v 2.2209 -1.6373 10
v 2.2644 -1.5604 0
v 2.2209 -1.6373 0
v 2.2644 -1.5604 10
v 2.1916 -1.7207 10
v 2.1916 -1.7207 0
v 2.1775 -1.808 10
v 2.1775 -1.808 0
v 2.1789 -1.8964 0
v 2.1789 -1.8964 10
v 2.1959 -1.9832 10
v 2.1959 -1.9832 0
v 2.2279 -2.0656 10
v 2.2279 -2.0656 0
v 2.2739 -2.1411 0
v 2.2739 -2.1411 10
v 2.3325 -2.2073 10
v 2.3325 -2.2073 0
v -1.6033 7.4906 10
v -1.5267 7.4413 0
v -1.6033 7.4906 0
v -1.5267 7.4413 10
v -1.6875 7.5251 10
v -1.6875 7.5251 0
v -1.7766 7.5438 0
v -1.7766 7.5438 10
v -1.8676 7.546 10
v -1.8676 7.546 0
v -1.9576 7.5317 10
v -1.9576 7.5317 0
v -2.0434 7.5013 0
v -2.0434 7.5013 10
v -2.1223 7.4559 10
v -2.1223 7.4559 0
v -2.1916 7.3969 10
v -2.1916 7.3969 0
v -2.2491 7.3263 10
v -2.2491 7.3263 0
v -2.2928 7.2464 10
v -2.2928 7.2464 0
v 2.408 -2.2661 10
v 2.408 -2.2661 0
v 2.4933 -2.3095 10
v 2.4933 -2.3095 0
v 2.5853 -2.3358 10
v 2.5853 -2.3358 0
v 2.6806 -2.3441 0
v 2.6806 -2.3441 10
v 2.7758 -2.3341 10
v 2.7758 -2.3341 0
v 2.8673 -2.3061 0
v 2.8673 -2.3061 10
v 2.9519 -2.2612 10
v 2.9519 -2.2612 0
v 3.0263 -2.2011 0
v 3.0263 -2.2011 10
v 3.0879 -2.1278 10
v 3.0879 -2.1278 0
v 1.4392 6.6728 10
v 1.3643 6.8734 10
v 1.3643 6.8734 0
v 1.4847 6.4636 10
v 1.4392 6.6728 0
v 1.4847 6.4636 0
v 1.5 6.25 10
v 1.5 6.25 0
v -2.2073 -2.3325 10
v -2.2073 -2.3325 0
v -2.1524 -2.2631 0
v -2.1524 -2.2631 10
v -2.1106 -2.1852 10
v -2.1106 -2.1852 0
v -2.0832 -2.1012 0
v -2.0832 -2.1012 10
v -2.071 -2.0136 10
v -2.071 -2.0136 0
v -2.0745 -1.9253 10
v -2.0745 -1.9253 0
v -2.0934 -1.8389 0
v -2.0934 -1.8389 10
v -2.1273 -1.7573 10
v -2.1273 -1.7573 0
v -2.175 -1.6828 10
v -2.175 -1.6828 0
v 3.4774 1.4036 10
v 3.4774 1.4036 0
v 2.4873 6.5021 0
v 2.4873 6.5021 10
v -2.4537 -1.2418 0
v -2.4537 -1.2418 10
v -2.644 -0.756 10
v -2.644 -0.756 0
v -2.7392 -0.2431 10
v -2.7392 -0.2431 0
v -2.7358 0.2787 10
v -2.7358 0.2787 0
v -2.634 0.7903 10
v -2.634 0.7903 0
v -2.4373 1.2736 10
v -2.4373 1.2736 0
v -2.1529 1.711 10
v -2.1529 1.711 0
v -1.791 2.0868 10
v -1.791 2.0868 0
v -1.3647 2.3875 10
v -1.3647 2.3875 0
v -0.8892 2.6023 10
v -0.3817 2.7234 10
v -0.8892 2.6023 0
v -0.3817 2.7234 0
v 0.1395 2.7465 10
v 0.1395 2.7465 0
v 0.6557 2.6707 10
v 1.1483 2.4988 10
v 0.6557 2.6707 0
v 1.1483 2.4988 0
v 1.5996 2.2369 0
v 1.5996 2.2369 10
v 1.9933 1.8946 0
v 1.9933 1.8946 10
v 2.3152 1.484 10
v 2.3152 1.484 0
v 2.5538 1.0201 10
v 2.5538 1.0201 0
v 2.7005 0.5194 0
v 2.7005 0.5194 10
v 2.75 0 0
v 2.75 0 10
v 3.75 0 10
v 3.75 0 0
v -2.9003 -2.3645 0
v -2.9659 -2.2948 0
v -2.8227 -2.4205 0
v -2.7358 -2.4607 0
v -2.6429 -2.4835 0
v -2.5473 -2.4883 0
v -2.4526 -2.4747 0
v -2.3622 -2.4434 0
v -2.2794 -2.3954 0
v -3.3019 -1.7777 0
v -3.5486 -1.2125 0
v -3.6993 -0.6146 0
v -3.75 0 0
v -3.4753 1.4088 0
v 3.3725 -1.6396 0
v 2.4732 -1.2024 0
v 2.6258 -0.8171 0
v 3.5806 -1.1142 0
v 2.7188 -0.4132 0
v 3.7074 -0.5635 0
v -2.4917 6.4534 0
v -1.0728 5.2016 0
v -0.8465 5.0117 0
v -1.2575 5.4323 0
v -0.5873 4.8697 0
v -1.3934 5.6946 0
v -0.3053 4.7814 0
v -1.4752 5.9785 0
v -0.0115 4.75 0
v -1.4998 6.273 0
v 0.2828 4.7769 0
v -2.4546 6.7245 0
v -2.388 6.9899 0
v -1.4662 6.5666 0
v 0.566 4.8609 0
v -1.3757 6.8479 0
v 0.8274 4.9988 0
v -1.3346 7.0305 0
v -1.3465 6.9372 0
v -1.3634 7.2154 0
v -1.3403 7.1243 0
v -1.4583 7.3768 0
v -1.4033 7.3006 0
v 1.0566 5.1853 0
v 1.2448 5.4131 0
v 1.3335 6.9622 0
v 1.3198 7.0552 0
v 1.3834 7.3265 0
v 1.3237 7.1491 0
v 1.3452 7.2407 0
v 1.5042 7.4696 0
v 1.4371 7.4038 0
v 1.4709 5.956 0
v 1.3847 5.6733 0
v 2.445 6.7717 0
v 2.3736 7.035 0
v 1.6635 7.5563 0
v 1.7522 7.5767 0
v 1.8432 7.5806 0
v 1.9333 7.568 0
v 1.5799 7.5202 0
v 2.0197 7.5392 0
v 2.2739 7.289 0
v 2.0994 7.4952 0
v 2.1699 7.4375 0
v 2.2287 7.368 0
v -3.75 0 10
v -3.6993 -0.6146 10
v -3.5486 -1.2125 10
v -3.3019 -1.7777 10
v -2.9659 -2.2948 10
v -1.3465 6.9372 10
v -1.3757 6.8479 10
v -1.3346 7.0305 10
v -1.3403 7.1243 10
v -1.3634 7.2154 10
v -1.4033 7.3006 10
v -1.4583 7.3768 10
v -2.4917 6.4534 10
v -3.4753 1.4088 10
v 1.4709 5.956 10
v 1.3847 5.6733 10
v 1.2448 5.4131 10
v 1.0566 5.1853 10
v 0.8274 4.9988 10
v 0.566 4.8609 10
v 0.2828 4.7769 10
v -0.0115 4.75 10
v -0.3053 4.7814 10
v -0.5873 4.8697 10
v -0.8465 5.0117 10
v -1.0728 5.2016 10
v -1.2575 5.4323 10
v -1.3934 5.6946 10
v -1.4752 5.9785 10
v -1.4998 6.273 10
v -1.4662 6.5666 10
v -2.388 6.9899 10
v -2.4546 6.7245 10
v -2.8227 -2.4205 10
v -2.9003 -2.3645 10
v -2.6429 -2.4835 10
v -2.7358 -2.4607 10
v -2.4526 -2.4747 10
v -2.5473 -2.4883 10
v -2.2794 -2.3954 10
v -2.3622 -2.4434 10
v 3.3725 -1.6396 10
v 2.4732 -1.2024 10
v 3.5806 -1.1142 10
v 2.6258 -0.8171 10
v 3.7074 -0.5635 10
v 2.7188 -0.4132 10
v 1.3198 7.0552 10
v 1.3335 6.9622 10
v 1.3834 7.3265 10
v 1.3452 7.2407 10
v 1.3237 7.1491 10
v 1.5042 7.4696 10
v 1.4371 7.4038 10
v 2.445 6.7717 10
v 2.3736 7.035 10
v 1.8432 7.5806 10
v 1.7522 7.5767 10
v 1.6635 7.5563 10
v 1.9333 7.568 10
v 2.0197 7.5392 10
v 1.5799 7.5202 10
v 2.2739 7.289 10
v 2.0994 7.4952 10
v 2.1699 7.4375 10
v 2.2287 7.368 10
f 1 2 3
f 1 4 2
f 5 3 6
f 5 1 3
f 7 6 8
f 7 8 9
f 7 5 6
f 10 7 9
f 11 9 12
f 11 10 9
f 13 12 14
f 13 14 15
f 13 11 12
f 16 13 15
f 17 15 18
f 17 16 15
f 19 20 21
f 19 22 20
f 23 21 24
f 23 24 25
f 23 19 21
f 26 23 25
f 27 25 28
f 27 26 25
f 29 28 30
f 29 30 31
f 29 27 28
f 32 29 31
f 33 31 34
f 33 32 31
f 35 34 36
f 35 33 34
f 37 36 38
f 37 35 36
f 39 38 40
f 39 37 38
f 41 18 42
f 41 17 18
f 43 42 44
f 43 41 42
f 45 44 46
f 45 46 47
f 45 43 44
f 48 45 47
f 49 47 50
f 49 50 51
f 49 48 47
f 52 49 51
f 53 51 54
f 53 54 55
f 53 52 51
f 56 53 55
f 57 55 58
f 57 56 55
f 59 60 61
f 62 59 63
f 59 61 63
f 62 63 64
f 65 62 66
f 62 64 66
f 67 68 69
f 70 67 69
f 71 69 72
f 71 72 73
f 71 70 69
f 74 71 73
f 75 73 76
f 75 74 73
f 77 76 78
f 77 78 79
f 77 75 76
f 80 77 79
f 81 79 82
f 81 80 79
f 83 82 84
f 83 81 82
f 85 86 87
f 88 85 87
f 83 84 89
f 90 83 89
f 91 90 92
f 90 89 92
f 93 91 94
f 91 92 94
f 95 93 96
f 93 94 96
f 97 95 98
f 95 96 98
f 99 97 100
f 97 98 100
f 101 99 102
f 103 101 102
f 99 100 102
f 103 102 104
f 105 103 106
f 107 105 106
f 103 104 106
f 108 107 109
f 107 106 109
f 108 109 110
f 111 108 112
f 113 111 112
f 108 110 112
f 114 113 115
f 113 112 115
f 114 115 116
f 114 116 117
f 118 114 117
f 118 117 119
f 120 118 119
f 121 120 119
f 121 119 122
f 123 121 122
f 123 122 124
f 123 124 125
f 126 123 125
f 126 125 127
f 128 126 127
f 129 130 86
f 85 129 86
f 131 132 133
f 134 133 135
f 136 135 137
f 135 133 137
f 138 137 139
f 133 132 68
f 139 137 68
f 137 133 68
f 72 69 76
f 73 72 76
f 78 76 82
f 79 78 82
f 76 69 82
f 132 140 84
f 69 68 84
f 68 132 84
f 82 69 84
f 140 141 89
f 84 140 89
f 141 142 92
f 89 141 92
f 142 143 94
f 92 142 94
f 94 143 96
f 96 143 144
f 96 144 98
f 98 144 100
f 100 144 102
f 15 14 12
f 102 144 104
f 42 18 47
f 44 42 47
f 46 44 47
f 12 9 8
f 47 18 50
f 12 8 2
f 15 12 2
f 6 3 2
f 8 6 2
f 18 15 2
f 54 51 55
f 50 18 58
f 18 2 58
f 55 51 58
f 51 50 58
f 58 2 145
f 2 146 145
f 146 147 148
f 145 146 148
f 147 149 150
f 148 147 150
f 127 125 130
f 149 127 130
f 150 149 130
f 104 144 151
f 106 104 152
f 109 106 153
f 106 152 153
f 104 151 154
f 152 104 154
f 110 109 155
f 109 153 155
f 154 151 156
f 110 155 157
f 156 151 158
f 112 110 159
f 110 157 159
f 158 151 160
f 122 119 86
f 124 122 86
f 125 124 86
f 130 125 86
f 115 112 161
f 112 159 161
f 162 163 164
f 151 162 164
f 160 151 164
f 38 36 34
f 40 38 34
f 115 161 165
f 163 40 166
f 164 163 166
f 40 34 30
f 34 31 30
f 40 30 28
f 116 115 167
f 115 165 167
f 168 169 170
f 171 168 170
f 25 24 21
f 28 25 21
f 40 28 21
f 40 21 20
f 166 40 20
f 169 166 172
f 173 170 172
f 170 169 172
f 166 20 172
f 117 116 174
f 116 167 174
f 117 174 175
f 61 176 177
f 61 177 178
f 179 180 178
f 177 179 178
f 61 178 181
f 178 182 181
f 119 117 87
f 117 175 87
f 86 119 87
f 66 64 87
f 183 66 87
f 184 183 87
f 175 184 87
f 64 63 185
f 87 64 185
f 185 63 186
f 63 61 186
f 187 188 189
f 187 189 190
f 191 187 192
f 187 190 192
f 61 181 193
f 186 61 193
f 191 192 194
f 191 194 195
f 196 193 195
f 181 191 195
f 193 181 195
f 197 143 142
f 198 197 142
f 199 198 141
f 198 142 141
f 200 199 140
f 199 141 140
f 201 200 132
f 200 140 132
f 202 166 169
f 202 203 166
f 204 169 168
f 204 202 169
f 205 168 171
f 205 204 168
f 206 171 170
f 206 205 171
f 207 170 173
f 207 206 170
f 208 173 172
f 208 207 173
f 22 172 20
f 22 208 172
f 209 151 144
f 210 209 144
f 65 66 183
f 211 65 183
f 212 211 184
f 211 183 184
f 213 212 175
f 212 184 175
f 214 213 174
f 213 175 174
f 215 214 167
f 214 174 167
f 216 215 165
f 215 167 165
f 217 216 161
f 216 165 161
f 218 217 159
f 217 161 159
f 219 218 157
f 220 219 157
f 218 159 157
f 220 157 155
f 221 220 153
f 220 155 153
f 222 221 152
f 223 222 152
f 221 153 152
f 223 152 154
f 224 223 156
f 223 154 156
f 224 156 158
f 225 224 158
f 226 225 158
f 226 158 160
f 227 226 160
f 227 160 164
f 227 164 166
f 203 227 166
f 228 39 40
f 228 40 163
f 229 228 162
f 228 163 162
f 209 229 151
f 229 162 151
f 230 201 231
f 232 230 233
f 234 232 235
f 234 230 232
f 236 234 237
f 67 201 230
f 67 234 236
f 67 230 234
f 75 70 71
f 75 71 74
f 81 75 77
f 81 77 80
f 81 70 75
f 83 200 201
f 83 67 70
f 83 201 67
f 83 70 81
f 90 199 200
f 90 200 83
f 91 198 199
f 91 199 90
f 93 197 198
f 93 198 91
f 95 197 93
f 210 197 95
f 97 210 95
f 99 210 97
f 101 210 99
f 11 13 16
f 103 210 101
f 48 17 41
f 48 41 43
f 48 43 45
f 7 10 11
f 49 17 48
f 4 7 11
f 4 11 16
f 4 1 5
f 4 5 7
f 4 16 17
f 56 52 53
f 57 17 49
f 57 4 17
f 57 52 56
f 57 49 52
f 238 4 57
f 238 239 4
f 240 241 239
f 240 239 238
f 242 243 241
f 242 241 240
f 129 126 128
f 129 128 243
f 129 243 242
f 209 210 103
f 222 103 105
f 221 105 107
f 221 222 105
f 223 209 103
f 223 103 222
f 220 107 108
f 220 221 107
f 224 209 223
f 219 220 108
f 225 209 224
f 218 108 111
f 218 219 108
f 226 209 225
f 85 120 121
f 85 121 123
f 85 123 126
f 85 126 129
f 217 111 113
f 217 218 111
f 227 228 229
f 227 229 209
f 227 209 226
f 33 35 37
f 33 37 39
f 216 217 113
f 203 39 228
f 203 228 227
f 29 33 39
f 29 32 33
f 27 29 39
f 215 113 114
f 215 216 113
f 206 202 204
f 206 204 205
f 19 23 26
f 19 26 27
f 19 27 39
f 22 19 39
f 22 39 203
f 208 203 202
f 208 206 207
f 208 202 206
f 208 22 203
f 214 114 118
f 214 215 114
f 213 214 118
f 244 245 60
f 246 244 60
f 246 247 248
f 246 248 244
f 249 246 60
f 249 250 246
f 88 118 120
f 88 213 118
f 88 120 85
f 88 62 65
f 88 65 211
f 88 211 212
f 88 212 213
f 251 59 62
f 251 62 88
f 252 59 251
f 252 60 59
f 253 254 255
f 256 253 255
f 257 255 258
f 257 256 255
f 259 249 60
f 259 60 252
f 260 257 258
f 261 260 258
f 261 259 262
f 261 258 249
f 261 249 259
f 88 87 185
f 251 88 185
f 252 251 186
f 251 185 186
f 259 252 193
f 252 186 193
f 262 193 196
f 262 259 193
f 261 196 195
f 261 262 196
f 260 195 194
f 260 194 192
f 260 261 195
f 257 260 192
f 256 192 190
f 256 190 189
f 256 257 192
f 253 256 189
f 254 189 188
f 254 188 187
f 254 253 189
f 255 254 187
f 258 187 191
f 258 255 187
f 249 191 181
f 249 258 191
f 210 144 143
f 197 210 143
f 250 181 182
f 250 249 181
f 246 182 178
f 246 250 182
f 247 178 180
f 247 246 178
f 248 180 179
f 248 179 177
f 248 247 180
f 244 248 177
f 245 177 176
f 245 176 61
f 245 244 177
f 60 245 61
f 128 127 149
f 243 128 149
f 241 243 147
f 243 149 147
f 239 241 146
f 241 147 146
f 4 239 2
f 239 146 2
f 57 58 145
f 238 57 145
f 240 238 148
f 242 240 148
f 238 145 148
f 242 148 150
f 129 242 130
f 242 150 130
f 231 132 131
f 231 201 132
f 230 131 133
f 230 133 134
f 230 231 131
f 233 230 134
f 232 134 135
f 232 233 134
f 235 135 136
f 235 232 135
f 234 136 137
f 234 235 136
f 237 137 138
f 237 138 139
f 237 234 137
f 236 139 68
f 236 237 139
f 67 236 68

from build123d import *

# Parameters (mm, degrees)
F1_DEPTH = 10
F2_R     = 0.49999


# Not quite as in the source:
# - a fillet or chamfer is up to 0.001 mm smaller than in the source, because OpenCascade refuses the exact size


with BuildPart() as f1:
    # F0 (on Top) → F1 (new body)
    with BuildSketch(Plane.XY):
        with BuildLine():
            Line((-3.4753119677, 1.4087961978), (-3.75, 0))
            ThreePointArc((-3.75, 0), (-3.4444328428, -1.4826943014), (-2.5775293913, -2.723755172))
            Line((-2.5775293913, -2.723755172), (-1.8901882203, -1.9974204595))
            ThreePointArc((-1.8901882203, -1.9974204595), (-1.0873091543, 2.5259174181), (2.75, 0))
            ThreePointArc((2.75, 0), (2.5549370113, -1.0172496587), (1.9974204595, -1.8901882203))
            Line((1.9974204595, -1.8901882203), (2.723755172, -2.5775293913))
            ThreePointArc((2.723755172, -2.5775293913), (3.4840050154, -1.3871586256), (3.75, 0))
            Line((3.75, 0), (3.4774126757, 1.4036028936))
            ThreePointArc((3.4774126757, 1.4036028936), (2.0974972168, 3.1085375059), (0, 3.75))
            ThreePointArc((0, 3.75), (-2.0951747252, 3.1101033537), (-3.4753119677, 1.4087961978))
        make_face()
        with BuildLine():
            Line((-2.4917121164, 6.4533979566), (-3.4753119677, 1.4087961978))
            ThreePointArc((-3.4753119677, 1.4087961978), (-2.0951747252, 3.1101033537), (0, 3.75))
            ThreePointArc((0, 3.75), (-1.8382729519, 4.5556704706), (-2.4917121164, 6.4533979566))
        make_face()
        with BuildLine():
            ThreePointArc((2.5, 6.25), (1.767766953, 4.482233047), (0, 3.75))
            ThreePointArc((0, 3.75), (2.0974972168, 3.1085375059), (3.4774126757, 1.4036028936))
            Line((3.4774126757, 1.4036028936), (2.4872564888, 6.5021014854))
            ThreePointArc((2.4872564888, 6.5021014854), (2.4968120896, 6.3762116833), (2.5, 6.25))
        make_face()
        with BuildLine():
            ThreePointArc((-2.4917121164, 6.4533979566), (-1.8382729519, 4.5556704706), (0, 3.75))
            ThreePointArc((0, 3.75), (1.767766953, 4.482233047), (2.5, 6.25))
            ThreePointArc((2.5, 6.25), (2.4968120896, 6.3762116833), (2.4872564888, 6.5021014854))
            ThreePointArc((2.4872564888, 6.5021014854), (2.3111850264, 7.2031126763), (1.9419288742, 7.8244561752))
            Line((1.9419288742, 7.8244561752), (1.1651573245, 7.1946737051))
            ThreePointArc((1.1651573245, 7.1946737051), (1.4138132809, 6.7511307281), (1.5, 6.25))
            ThreePointArc((1.5, 6.25), (-0.4879304654, 4.831576981), (-1.1825651479, 7.1727890718))
            Line((-1.1825651479, 7.1727890718), (-1.9709419132, 7.7879817863))
            ThreePointArc((-1.9709419132, 7.7879817863), (-2.3289694602, 7.1587910945), (-2.4917121164, 6.4533979566))
        make_face()
    extrude(amount=F1_DEPTH)

    # F2 (radius 0.5 in the source; OpenCascade refuses exactly that, so slightly less here)
    f2_edges = [f1.edges().sort_by_distance(p)[0] for p in [
        (-1.182565, 7.172789, 5),
        (1.165157, 7.194674, 5),
        (-1.890188, -1.99742, 5),
        (1.99742, -1.890188, 5),
        (-1.970942, 7.787982, 5),
        (1.941929, 7.824456, 5),
        (2.723755, -2.577529, 5),
        (-2.577529, -2.723755, 5),
    ]]
    fillet(f2_edges, radius=F2_R)


solid = f1.part
